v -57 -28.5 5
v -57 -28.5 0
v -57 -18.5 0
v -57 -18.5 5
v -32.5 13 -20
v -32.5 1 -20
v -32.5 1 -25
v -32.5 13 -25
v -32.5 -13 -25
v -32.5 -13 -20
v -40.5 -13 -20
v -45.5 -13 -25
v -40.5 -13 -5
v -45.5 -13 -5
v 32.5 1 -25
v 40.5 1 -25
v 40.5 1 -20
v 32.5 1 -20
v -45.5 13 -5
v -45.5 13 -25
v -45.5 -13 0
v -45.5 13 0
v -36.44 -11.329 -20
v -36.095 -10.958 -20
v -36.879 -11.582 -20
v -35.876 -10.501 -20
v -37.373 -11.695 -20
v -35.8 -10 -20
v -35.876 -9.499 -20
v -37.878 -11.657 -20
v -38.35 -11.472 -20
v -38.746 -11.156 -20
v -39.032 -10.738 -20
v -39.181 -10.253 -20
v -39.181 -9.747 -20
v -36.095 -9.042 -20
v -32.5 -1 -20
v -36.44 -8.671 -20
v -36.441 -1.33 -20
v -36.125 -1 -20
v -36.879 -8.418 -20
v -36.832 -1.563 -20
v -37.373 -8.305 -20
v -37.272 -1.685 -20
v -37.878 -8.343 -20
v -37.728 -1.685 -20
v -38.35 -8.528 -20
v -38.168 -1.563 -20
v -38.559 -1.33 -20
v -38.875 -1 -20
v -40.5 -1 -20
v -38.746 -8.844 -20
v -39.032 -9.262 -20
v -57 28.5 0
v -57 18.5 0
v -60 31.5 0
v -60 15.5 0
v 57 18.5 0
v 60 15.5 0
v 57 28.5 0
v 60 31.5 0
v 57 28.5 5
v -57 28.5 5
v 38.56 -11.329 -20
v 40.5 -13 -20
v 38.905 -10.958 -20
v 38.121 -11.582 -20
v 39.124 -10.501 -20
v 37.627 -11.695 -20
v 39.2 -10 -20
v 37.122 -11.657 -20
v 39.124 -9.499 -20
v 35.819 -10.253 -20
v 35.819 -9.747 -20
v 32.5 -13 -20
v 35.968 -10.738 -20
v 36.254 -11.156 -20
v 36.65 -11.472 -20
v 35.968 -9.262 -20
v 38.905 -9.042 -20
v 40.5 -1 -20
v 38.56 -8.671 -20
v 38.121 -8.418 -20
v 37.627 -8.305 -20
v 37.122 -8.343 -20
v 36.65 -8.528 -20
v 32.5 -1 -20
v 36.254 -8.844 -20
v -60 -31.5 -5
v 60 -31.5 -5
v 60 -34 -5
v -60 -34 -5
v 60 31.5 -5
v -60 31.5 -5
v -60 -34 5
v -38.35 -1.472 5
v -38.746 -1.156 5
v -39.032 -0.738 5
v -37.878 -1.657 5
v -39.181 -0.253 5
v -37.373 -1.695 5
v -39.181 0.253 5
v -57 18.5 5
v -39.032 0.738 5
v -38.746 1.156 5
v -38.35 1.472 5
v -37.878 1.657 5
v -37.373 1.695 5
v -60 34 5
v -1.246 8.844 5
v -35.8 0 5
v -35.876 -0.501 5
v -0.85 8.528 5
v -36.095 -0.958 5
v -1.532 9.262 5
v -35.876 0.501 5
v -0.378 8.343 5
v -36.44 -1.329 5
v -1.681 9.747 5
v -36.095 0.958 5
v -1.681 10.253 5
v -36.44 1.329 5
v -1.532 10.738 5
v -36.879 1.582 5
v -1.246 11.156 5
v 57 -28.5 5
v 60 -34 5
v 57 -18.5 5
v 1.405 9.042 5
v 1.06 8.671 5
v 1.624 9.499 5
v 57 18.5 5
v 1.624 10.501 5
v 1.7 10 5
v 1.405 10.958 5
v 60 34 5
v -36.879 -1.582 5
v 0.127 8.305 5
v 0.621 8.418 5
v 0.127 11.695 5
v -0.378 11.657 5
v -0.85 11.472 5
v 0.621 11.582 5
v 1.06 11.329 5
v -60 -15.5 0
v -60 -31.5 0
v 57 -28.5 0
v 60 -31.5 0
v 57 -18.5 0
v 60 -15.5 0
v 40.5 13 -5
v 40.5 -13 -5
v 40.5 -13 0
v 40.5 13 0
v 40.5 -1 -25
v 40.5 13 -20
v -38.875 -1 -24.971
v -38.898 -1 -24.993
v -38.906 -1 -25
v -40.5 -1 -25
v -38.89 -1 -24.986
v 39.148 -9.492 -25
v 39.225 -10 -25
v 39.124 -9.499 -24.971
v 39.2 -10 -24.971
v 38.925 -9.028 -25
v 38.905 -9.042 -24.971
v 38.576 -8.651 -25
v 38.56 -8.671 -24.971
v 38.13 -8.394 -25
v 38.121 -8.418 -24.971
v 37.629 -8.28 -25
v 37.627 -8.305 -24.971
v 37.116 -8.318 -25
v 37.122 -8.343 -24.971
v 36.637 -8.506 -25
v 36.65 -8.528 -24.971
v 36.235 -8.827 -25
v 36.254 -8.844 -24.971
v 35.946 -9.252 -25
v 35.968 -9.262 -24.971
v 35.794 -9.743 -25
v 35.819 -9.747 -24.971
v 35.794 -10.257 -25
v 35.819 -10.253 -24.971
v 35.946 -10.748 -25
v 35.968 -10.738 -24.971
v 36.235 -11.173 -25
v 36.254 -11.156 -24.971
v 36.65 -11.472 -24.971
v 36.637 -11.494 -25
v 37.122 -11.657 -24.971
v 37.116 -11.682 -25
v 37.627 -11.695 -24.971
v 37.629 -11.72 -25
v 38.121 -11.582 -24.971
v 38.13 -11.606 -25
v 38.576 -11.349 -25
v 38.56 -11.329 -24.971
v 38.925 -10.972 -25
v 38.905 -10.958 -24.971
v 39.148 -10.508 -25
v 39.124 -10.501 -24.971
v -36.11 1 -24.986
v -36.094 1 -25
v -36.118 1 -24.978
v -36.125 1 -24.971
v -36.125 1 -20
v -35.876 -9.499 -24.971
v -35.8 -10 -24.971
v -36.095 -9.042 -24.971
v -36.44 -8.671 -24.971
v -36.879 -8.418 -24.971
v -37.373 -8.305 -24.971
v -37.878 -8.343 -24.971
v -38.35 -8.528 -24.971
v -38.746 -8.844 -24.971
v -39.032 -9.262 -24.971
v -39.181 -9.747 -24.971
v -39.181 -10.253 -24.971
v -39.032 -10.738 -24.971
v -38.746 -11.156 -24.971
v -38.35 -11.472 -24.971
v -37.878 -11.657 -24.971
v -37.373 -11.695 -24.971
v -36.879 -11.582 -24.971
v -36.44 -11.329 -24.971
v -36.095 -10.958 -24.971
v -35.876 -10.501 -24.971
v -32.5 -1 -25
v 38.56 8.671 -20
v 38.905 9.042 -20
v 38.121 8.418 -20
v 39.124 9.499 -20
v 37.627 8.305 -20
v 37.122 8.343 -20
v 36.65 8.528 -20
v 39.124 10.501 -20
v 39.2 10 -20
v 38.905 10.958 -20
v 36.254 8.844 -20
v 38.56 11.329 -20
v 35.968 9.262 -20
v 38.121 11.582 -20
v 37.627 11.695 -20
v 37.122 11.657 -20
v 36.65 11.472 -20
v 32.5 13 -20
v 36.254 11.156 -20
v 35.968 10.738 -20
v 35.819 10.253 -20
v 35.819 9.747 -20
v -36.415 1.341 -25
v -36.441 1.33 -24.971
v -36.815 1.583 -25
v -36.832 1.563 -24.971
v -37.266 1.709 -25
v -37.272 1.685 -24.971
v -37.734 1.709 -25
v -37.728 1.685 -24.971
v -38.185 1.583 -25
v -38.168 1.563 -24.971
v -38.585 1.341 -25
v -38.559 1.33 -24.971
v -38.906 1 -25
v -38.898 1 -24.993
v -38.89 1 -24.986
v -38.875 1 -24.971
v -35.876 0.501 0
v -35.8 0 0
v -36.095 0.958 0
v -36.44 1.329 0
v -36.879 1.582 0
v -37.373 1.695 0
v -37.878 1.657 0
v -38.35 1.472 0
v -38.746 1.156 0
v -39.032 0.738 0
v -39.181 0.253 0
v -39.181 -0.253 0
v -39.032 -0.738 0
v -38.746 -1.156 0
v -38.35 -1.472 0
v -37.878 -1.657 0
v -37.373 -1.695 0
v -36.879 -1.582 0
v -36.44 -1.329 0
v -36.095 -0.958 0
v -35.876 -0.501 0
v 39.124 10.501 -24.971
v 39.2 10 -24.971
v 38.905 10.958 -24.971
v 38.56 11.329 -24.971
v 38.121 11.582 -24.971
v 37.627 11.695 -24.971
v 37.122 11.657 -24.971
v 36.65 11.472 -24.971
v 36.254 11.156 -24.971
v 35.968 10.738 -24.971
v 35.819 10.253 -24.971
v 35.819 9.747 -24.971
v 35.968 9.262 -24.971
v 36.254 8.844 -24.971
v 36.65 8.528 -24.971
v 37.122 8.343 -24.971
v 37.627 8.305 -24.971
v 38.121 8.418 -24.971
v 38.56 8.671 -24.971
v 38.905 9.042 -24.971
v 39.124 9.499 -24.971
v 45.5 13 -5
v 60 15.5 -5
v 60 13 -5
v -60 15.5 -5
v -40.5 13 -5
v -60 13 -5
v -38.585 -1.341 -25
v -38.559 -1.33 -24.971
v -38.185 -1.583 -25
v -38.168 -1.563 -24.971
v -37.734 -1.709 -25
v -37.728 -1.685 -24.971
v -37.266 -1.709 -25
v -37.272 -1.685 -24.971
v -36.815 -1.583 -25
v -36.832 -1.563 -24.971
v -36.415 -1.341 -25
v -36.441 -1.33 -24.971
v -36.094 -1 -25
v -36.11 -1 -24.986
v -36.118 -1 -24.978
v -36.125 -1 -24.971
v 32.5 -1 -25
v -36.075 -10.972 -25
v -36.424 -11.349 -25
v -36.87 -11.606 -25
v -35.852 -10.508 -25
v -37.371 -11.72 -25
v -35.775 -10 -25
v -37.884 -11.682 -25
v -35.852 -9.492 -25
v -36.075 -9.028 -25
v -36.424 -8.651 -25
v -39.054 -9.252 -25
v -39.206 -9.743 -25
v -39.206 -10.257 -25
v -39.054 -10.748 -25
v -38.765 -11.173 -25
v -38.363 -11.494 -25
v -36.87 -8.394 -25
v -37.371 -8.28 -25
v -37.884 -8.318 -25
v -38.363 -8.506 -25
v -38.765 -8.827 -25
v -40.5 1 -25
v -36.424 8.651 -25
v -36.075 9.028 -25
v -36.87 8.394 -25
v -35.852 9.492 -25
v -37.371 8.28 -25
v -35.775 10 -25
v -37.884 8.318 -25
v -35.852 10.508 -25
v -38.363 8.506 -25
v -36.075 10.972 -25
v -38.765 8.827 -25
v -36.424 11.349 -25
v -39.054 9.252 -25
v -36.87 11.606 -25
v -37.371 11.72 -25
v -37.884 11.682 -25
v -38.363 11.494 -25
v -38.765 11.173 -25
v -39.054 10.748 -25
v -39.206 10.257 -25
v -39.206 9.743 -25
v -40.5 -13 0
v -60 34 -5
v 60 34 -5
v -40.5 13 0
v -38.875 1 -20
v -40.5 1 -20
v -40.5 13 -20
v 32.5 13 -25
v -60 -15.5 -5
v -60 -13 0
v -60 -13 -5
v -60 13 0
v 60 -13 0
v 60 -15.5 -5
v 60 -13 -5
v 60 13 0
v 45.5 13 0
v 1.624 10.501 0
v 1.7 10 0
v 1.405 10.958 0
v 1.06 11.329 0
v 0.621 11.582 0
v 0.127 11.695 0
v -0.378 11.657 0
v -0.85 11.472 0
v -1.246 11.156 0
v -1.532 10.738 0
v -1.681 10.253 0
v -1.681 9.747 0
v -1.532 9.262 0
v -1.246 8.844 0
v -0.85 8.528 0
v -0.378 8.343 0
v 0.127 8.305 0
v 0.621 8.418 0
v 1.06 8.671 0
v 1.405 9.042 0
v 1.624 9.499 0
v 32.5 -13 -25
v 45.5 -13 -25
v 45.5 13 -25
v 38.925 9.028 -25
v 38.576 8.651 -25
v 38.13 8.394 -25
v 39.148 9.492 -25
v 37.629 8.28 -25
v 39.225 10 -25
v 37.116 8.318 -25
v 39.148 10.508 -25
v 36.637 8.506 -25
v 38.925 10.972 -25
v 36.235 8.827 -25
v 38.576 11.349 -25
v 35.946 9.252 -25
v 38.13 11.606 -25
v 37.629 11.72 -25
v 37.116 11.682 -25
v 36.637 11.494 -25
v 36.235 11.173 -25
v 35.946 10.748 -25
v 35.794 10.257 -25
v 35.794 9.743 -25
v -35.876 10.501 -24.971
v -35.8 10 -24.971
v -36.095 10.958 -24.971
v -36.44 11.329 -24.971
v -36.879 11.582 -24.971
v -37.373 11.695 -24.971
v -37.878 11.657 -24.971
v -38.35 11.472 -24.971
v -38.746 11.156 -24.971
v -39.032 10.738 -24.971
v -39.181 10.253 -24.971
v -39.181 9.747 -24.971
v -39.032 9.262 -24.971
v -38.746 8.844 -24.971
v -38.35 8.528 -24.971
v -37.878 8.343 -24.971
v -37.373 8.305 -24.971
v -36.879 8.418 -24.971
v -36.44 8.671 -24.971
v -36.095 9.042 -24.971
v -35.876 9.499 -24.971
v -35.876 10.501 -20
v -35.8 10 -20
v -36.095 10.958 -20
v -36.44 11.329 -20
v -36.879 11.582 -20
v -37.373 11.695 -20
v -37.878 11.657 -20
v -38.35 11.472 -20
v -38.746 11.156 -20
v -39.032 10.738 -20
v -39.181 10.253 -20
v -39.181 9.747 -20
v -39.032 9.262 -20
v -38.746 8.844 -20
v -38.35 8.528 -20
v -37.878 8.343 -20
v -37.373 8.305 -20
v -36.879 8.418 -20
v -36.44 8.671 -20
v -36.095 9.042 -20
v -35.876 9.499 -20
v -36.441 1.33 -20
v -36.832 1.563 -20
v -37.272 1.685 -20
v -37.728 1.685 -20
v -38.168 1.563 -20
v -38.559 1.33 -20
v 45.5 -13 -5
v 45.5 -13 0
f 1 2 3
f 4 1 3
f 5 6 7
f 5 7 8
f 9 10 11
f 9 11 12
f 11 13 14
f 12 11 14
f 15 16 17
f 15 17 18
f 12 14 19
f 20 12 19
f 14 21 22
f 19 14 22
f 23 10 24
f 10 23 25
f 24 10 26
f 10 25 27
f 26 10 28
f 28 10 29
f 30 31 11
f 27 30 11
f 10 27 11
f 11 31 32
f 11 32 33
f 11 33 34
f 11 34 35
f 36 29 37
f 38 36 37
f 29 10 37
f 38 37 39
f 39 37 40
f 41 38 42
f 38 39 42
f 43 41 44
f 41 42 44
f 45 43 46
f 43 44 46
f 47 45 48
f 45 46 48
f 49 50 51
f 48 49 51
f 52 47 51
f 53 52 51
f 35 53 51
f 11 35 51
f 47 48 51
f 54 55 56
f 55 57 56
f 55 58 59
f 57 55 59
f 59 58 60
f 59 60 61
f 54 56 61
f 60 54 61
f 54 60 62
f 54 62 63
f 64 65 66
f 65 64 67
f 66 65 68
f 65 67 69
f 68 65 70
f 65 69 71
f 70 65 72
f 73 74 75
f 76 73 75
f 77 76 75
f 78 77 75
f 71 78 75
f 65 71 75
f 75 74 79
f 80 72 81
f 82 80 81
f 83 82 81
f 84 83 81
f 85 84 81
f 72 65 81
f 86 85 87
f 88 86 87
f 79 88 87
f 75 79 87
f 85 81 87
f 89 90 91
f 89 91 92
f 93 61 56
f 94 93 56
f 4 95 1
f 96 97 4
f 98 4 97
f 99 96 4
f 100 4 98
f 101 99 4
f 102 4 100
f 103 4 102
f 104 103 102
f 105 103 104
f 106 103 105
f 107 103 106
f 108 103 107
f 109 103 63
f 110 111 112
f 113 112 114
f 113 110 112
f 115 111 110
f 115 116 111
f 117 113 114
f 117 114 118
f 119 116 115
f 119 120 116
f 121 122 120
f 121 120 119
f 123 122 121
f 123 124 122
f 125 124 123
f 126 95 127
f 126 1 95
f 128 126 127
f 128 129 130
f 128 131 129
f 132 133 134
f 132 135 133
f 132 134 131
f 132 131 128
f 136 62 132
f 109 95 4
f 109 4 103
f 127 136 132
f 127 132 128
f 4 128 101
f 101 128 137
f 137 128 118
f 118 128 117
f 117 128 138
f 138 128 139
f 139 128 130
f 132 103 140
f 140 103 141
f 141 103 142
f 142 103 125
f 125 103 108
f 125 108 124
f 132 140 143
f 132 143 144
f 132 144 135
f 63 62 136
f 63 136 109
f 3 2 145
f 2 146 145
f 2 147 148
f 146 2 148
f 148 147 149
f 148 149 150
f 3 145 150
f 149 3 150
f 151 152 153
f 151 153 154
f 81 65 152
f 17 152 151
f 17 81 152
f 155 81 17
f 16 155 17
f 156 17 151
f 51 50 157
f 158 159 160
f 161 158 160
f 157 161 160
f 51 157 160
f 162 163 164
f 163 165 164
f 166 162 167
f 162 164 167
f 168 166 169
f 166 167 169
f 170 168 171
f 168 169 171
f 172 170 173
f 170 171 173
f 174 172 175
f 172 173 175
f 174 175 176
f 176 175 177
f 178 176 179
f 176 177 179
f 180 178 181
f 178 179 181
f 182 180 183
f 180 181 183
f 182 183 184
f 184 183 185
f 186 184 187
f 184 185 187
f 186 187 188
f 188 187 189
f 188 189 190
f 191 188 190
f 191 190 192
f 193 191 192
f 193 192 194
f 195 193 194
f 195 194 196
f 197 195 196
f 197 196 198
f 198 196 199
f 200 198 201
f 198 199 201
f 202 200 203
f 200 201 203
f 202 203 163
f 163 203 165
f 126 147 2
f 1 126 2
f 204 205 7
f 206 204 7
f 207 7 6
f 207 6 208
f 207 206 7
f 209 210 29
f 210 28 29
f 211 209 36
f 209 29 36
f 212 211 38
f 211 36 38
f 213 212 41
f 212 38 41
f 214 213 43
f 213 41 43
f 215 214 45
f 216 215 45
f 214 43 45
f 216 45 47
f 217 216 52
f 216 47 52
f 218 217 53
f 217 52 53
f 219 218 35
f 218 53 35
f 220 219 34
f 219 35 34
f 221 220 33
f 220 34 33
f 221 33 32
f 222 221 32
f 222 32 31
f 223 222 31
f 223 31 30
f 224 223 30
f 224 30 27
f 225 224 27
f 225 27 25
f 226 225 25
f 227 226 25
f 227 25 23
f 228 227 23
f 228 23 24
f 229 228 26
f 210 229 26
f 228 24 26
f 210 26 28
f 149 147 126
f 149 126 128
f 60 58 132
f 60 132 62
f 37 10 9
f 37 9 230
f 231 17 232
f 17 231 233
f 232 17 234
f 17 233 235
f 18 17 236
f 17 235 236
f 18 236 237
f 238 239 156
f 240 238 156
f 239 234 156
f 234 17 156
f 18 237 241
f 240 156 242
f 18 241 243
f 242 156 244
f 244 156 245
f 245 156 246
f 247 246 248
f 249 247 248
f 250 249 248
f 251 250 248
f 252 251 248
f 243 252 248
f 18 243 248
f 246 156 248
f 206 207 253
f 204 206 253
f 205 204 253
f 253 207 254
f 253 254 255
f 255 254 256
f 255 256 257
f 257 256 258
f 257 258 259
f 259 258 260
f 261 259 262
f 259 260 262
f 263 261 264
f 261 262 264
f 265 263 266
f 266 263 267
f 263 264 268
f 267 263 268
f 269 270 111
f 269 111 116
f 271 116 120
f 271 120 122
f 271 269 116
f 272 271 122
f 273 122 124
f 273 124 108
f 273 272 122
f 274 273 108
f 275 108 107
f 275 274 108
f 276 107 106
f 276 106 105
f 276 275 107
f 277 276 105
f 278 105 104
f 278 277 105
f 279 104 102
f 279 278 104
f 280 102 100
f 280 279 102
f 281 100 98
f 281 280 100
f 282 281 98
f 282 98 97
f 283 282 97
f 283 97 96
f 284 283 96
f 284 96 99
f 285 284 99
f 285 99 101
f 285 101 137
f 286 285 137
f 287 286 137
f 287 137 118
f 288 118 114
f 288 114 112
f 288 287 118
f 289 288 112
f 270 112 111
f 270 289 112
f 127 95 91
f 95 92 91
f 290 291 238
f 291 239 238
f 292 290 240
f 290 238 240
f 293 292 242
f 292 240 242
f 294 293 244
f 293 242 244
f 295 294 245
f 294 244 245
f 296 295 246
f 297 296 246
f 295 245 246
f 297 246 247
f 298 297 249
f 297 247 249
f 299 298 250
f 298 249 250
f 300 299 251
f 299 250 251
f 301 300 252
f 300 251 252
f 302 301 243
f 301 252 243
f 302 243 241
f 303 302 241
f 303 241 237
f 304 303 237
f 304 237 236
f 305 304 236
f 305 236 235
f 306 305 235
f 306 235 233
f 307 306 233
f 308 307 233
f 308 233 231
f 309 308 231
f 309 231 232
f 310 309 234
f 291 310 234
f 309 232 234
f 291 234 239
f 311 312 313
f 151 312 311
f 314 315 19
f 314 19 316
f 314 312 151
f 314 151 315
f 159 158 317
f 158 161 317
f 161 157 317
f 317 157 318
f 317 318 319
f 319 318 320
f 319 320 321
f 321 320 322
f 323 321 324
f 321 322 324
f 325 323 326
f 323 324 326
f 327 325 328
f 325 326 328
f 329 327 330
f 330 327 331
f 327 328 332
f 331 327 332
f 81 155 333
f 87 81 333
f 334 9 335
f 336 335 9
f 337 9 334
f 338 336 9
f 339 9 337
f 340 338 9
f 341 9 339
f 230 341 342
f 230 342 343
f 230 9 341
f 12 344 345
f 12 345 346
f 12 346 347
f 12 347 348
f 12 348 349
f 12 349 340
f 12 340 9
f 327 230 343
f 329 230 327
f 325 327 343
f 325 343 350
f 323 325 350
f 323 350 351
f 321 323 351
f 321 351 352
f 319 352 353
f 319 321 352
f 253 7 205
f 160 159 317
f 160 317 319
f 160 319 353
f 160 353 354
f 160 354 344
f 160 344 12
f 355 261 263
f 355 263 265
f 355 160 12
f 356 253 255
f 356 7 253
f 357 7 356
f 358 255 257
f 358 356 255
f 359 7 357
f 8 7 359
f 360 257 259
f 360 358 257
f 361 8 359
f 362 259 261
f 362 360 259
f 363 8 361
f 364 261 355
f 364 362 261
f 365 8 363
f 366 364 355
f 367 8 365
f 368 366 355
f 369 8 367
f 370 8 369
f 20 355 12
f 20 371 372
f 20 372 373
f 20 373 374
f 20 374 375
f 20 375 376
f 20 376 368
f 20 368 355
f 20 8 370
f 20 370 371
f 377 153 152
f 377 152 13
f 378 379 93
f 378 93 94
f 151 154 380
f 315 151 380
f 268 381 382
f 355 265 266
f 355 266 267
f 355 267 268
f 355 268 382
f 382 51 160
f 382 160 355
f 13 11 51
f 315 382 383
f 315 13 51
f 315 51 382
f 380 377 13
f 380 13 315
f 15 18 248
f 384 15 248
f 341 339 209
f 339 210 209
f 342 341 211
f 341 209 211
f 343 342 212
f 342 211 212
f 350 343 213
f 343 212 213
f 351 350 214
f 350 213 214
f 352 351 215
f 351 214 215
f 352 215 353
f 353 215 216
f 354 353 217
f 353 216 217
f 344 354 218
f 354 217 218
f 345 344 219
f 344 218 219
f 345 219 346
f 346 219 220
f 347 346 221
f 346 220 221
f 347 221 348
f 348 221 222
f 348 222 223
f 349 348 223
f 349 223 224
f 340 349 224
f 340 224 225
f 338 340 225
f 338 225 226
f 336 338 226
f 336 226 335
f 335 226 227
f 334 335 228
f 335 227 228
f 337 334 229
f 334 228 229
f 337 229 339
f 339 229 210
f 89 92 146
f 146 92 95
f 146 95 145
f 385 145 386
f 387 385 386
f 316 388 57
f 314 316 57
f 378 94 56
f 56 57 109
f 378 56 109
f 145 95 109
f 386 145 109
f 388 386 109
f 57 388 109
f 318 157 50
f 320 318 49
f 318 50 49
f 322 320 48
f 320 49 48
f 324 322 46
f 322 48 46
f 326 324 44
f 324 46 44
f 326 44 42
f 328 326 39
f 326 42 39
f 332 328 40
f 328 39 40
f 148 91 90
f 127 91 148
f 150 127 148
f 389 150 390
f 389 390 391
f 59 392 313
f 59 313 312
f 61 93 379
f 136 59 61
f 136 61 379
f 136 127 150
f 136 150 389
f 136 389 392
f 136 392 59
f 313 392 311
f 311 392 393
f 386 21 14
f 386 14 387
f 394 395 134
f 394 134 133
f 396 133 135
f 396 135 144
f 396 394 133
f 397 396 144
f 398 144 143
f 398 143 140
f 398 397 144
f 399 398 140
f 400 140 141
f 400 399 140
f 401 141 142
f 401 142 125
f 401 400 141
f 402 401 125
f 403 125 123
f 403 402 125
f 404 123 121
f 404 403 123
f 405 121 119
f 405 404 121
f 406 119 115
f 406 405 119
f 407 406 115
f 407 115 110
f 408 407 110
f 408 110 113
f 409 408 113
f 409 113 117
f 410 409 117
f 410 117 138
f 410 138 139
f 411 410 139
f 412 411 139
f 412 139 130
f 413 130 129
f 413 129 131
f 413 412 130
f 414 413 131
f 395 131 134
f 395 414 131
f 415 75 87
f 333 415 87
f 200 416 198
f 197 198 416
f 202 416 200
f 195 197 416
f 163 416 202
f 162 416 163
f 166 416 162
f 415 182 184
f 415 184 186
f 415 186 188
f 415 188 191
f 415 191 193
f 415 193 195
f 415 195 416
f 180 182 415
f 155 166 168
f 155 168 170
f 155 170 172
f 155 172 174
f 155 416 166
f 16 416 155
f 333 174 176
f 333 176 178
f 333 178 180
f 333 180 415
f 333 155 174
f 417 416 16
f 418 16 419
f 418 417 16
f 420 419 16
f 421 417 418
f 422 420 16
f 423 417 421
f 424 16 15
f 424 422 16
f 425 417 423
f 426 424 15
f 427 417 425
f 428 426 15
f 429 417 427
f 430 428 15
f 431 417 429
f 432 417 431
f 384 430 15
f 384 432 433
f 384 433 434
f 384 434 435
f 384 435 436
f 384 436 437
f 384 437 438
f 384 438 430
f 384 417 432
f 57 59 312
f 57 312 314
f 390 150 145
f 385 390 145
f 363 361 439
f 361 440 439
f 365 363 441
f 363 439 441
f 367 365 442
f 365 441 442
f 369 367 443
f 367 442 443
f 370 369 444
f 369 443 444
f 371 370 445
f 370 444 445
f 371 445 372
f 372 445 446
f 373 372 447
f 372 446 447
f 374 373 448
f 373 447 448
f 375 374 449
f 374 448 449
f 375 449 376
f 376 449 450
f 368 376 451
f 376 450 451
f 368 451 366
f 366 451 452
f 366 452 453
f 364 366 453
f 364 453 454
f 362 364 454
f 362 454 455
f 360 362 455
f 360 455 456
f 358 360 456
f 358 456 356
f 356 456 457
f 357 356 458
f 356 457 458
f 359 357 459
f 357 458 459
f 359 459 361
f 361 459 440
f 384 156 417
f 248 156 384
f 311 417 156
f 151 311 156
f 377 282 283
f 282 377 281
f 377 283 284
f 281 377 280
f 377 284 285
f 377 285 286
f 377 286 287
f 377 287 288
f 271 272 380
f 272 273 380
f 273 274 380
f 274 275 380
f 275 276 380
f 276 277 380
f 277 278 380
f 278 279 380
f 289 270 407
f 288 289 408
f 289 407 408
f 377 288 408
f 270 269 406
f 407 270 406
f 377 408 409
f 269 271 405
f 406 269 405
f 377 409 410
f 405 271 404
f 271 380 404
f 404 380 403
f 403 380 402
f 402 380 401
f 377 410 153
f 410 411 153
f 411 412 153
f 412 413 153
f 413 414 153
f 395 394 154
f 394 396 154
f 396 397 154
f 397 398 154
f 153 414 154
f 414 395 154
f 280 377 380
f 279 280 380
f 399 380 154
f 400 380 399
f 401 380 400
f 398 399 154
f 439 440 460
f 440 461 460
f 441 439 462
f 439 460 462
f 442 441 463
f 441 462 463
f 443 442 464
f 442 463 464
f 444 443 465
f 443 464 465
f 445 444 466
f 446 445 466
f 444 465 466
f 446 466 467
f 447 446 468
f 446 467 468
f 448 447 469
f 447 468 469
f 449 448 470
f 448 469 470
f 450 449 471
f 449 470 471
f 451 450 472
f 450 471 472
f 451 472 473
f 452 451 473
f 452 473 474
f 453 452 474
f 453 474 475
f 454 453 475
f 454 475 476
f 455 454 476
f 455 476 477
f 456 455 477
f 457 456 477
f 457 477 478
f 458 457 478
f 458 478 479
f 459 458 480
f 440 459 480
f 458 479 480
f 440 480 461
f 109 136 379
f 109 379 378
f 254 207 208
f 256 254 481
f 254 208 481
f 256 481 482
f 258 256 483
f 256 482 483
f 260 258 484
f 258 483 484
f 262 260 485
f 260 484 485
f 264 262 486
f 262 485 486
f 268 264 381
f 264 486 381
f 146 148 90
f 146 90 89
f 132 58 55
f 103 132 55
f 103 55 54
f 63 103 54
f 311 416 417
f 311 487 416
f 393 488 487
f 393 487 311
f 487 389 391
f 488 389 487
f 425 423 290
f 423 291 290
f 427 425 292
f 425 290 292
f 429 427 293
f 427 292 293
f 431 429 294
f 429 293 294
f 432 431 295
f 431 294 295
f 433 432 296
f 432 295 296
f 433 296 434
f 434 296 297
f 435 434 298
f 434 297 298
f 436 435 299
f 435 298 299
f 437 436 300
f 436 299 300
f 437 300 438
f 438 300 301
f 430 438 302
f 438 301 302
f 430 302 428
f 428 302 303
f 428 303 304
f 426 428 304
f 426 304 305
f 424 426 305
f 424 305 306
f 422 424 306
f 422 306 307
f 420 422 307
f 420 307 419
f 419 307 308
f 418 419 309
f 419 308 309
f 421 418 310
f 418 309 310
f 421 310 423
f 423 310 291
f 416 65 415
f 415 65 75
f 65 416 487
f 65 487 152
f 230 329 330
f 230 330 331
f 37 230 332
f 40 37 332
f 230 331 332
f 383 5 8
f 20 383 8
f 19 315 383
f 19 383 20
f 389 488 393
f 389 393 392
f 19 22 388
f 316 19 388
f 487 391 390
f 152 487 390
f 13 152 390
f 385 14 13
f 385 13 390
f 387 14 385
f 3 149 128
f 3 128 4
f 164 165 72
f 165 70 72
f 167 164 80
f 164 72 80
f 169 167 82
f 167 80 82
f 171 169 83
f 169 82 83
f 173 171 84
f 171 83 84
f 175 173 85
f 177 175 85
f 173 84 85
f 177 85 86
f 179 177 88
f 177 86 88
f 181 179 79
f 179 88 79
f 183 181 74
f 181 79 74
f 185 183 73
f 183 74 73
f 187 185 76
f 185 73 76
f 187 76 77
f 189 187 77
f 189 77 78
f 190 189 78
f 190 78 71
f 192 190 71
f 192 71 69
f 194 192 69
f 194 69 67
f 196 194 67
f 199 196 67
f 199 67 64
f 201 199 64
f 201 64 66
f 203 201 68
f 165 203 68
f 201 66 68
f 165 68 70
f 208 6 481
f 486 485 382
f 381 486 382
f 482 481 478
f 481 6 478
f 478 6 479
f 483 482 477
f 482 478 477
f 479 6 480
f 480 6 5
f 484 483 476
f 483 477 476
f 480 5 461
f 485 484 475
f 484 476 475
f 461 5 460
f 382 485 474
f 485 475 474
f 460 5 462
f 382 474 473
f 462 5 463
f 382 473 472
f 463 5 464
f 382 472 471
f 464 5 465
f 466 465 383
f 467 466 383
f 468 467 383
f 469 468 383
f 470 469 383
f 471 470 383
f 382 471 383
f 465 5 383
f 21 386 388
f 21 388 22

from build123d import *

# Parameters (mm, degrees)
SKETCH_1_W                 = 120
SKETCH_1_H                 = 68
EXTRUDE_1_DEPTH            = 5
SKETCH_2_W                 = 120
SKETCH_2_H                 = 2.5
EXTRUDE_2_DEPTH            = 5
CUT_EXTRUDE_1_REACH        = 71.145
SKETCH_3_W                 = 114
SKETCH_3_H                 = 10
SKETCH_4_W                 = 5
SKETCH_4_H                 = 26
EXTRUDE_3_DEPTH            = 20
SKETCH_5_W                 = 13
SKETCH_5_H                 = 26
EXTRUDE_4_DEPTH            = 5
CUT_EXTRUDE_2_REACH        = 77.206
SKETCH_6_W                 = 8
SKETCH_6_H                 = 2
HOLE_WIZARD_M3_1_OUTLINE_R = 1.7
HOLE_WIZARD_M3_1_DEPTH     = 5


# Read off the part's stored shape, not the designer's step: M3 すきま穴1
with BuildPart() as part:
    # ｽｹｯﾁ1 → ﾎﾞｽ - 押し出し1 (new body)
    with BuildSketch(Plane.XY):
        Rectangle(SKETCH_1_W, SKETCH_1_H)
    extrude(amount=EXTRUDE_1_DEPTH)

    # ｽｹｯﾁ2 → ﾎﾞｽ - 押し出し2 (add)
    with BuildSketch(Plane(origin=(0, 0, 0), x_dir=(-1, 0, 0), z_dir=(0, 0, -1))):
        with Locations((0, 32.75)):
            Rectangle(SKETCH_2_W, SKETCH_2_H)
        with Locations((0, 14.25)):
            Rectangle(SKETCH_2_W, SKETCH_2_H)
        with Locations((0, -14.25)):
            Rectangle(SKETCH_2_W, SKETCH_2_H)
        with Locations((0, -32.75)):
            Rectangle(SKETCH_2_W, SKETCH_2_H)
    extrude(amount=EXTRUDE_2_DEPTH)

    # ｽｹｯﾁ3 → ｶｯﾄ - 押し出し1 (cut, up to next)
    with BuildSketch(Plane(origin=(0, 0, 0), x_dir=(-1, 0, 0), z_dir=(0, 0, -1)), mode=Mode.PRIVATE) as cut_extrude_1_sk1:
        with Locations((0, 23.5)):
            Rectangle(SKETCH_3_W, SKETCH_3_H)
    cut_extrude_1_tool1 = extrude(cut_extrude_1_sk1.sketch, amount=-CUT_EXTRUDE_1_REACH, mode=Mode.PRIVATE) & part.part
    # ｽｹｯﾁ3 → ｶｯﾄ - 押し出し1 (cut, up to next)
    with BuildSketch(Plane(origin=(0, 0, 0), x_dir=(-1, 0, 0), z_dir=(0, 0, -1)), mode=Mode.PRIVATE) as cut_extrude_1_sk2:
        with Locations((0, -23.5)):
            Rectangle(SKETCH_3_W, SKETCH_3_H)
    cut_extrude_1_tool2 = extrude(cut_extrude_1_sk2.sketch, amount=-CUT_EXTRUDE_1_REACH, mode=Mode.PRIVATE) & part.part
    add(cut_extrude_1_tool1.solids().sort_by_distance((0, 23.5, 0))[0], mode=Mode.SUBTRACT)
    add(cut_extrude_1_tool2.solids().sort_by_distance((0, -23.5, 0))[0], mode=Mode.SUBTRACT)

    # ｽｹｯﾁ4 → ﾎﾞｽ - 押し出し3 (add)
    with BuildSketch(Plane(origin=(0, 0, 0), x_dir=(-1, 0, 0), z_dir=(0, 0, -1))):
        with Locations((-43, 0)):
            Rectangle(SKETCH_4_W, SKETCH_4_H)
        with Locations((43, 0)):
            Rectangle(SKETCH_4_W, SKETCH_4_H)
    extrude(amount=EXTRUDE_3_DEPTH)

    # ｽｹｯﾁ5 → ﾎﾞｽ - 押し出し4 (add)
    with BuildSketch(Plane(origin=(0, 0, -20), x_dir=(-1, 0, 0), z_dir=(0, 0, -1))):
        with Locations((-39, 0)):
            Rectangle(SKETCH_5_W, SKETCH_5_H)
        with Locations((39, 0)):
            Rectangle(SKETCH_5_W, SKETCH_5_H)
    extrude(amount=EXTRUDE_4_DEPTH)

    # ｽｹｯﾁ6 → ｶｯﾄ - 押し出し2 (cut, up to next)
    with BuildSketch(Plane(origin=(0, 0, -25), x_dir=(-1, 0, 0), z_dir=(0, 0, -1)), mode=Mode.PRIVATE) as cut_extrude_2_sk1:
        with Locations((-36.5, 0)):
            Rectangle(SKETCH_6_W, SKETCH_6_H)
    cut_extrude_2_tool1 = extrude(cut_extrude_2_sk1.sketch, amount=-CUT_EXTRUDE_2_REACH, mode=Mode.PRIVATE) & part.part
    # ｽｹｯﾁ6 → ｶｯﾄ - 押し出し2 (cut, up to next)
    with BuildSketch(Plane(origin=(0, 0, -25), x_dir=(-1, 0, 0), z_dir=(0, 0, -1)), mode=Mode.PRIVATE) as cut_extrude_2_sk2:
        with Locations((36.5, 0)):
            Rectangle(SKETCH_6_W, SKETCH_6_H)
    cut_extrude_2_tool2 = extrude(cut_extrude_2_sk2.sketch, amount=-CUT_EXTRUDE_2_REACH, mode=Mode.PRIVATE) & part.part
    add(cut_extrude_2_tool1.solids().sort_by_distance((36.5, 0, -25))[0], mode=Mode.SUBTRACT)
    add(cut_extrude_2_tool2.solids().sort_by_distance((-36.5, 0, -25))[0], mode=Mode.SUBTRACT)

    # M3 すきま穴1 outline → M3 すきま穴1 (cut)
    with BuildSketch(Plane.XY):
        with Locations((0, 10)):
            Circle(HOLE_WIZARD_M3_1_OUTLINE_R)
        with Locations((-37.5, 0)):
            Circle(HOLE_WIZARD_M3_1_OUTLINE_R)
    extrude(amount=HOLE_WIZARD_M3_1_DEPTH, mode=Mode.SUBTRACT)

    # Hole Wizard M3 _1 2 outline → Hole Wizard M3 _1 2 (revolve, cut)
    with BuildSketch(Plane(origin=(-37.5, 0, 0), x_dir=(1, 0, 0), z_dir=(0, -1, 0))):
        Polygon((1.7, -24.97124079), (1.7, -20), (0, -20), (0, -25.000000133), (1.725000116, -25.000000133), align=None)
    revolve(axis=Axis((-37.5, 0, 0), (0, 0, 1)), mode=Mode.SUBTRACT)

    # Hole Wizard M3 _1 3 outline → Hole Wizard M3 _1 3 (revolve, cut)
    with BuildSketch(Plane(origin=(-37.5, 10, 0), x_dir=(1, 0, 0), z_dir=(0, -1, 0))):
        Polygon((1.7, -24.97124079), (1.7, -20), (0, -20), (0, -25), (1.725, -25), align=None)
    revolve(axis=Axis((-37.5, 10, 0), (0, 0, 1)), mode=Mode.SUBTRACT)

    # Hole Wizard M3 _1 4 outline → Hole Wizard M3 _1 4 (revolve, cut)
    with BuildSketch(Plane(origin=(37.5, -10, 0), x_dir=(1, 0, 0), z_dir=(0, -1, 0))):
        Polygon((1.7, -24.97124079), (1.7, -20), (0, -20), (0, -25), (1.725, -25), align=None)
    revolve(axis=Axis((37.5, -10, 0), (0, 0, 1)), mode=Mode.SUBTRACT)

    # Hole Wizard M3 _1 5 outline → Hole Wizard M3 _1 5 (revolve, cut)
    with BuildSketch(Plane(origin=(-37.5, -10, 0), x_dir=(1, 0, 0), z_dir=(0, -1, 0))):
        Polygon((1.7, -24.97124079), (1.7, -20), (0, -20), (0, -25), (1.725, -25), align=None)
    revolve(axis=Axis((-37.5, -10, 0), (0, 0, 1)), mode=Mode.SUBTRACT)

    # Hole Wizard M3 _1 6 outline → Hole Wizard M3 _1 6 (revolve, cut)
    with BuildSketch(Plane(origin=(37.5, 10, 0), x_dir=(1, 0, 0), z_dir=(0, -1, 0))):
        Polygon((1.7, -24.97124079), (1.7, -20), (0, -20), (0, -25), (1.725, -25), align=None)
    revolve(axis=Axis((37.5, 10, 0), (0, 0, 1)), mode=Mode.SUBTRACT)


solid = part.part
